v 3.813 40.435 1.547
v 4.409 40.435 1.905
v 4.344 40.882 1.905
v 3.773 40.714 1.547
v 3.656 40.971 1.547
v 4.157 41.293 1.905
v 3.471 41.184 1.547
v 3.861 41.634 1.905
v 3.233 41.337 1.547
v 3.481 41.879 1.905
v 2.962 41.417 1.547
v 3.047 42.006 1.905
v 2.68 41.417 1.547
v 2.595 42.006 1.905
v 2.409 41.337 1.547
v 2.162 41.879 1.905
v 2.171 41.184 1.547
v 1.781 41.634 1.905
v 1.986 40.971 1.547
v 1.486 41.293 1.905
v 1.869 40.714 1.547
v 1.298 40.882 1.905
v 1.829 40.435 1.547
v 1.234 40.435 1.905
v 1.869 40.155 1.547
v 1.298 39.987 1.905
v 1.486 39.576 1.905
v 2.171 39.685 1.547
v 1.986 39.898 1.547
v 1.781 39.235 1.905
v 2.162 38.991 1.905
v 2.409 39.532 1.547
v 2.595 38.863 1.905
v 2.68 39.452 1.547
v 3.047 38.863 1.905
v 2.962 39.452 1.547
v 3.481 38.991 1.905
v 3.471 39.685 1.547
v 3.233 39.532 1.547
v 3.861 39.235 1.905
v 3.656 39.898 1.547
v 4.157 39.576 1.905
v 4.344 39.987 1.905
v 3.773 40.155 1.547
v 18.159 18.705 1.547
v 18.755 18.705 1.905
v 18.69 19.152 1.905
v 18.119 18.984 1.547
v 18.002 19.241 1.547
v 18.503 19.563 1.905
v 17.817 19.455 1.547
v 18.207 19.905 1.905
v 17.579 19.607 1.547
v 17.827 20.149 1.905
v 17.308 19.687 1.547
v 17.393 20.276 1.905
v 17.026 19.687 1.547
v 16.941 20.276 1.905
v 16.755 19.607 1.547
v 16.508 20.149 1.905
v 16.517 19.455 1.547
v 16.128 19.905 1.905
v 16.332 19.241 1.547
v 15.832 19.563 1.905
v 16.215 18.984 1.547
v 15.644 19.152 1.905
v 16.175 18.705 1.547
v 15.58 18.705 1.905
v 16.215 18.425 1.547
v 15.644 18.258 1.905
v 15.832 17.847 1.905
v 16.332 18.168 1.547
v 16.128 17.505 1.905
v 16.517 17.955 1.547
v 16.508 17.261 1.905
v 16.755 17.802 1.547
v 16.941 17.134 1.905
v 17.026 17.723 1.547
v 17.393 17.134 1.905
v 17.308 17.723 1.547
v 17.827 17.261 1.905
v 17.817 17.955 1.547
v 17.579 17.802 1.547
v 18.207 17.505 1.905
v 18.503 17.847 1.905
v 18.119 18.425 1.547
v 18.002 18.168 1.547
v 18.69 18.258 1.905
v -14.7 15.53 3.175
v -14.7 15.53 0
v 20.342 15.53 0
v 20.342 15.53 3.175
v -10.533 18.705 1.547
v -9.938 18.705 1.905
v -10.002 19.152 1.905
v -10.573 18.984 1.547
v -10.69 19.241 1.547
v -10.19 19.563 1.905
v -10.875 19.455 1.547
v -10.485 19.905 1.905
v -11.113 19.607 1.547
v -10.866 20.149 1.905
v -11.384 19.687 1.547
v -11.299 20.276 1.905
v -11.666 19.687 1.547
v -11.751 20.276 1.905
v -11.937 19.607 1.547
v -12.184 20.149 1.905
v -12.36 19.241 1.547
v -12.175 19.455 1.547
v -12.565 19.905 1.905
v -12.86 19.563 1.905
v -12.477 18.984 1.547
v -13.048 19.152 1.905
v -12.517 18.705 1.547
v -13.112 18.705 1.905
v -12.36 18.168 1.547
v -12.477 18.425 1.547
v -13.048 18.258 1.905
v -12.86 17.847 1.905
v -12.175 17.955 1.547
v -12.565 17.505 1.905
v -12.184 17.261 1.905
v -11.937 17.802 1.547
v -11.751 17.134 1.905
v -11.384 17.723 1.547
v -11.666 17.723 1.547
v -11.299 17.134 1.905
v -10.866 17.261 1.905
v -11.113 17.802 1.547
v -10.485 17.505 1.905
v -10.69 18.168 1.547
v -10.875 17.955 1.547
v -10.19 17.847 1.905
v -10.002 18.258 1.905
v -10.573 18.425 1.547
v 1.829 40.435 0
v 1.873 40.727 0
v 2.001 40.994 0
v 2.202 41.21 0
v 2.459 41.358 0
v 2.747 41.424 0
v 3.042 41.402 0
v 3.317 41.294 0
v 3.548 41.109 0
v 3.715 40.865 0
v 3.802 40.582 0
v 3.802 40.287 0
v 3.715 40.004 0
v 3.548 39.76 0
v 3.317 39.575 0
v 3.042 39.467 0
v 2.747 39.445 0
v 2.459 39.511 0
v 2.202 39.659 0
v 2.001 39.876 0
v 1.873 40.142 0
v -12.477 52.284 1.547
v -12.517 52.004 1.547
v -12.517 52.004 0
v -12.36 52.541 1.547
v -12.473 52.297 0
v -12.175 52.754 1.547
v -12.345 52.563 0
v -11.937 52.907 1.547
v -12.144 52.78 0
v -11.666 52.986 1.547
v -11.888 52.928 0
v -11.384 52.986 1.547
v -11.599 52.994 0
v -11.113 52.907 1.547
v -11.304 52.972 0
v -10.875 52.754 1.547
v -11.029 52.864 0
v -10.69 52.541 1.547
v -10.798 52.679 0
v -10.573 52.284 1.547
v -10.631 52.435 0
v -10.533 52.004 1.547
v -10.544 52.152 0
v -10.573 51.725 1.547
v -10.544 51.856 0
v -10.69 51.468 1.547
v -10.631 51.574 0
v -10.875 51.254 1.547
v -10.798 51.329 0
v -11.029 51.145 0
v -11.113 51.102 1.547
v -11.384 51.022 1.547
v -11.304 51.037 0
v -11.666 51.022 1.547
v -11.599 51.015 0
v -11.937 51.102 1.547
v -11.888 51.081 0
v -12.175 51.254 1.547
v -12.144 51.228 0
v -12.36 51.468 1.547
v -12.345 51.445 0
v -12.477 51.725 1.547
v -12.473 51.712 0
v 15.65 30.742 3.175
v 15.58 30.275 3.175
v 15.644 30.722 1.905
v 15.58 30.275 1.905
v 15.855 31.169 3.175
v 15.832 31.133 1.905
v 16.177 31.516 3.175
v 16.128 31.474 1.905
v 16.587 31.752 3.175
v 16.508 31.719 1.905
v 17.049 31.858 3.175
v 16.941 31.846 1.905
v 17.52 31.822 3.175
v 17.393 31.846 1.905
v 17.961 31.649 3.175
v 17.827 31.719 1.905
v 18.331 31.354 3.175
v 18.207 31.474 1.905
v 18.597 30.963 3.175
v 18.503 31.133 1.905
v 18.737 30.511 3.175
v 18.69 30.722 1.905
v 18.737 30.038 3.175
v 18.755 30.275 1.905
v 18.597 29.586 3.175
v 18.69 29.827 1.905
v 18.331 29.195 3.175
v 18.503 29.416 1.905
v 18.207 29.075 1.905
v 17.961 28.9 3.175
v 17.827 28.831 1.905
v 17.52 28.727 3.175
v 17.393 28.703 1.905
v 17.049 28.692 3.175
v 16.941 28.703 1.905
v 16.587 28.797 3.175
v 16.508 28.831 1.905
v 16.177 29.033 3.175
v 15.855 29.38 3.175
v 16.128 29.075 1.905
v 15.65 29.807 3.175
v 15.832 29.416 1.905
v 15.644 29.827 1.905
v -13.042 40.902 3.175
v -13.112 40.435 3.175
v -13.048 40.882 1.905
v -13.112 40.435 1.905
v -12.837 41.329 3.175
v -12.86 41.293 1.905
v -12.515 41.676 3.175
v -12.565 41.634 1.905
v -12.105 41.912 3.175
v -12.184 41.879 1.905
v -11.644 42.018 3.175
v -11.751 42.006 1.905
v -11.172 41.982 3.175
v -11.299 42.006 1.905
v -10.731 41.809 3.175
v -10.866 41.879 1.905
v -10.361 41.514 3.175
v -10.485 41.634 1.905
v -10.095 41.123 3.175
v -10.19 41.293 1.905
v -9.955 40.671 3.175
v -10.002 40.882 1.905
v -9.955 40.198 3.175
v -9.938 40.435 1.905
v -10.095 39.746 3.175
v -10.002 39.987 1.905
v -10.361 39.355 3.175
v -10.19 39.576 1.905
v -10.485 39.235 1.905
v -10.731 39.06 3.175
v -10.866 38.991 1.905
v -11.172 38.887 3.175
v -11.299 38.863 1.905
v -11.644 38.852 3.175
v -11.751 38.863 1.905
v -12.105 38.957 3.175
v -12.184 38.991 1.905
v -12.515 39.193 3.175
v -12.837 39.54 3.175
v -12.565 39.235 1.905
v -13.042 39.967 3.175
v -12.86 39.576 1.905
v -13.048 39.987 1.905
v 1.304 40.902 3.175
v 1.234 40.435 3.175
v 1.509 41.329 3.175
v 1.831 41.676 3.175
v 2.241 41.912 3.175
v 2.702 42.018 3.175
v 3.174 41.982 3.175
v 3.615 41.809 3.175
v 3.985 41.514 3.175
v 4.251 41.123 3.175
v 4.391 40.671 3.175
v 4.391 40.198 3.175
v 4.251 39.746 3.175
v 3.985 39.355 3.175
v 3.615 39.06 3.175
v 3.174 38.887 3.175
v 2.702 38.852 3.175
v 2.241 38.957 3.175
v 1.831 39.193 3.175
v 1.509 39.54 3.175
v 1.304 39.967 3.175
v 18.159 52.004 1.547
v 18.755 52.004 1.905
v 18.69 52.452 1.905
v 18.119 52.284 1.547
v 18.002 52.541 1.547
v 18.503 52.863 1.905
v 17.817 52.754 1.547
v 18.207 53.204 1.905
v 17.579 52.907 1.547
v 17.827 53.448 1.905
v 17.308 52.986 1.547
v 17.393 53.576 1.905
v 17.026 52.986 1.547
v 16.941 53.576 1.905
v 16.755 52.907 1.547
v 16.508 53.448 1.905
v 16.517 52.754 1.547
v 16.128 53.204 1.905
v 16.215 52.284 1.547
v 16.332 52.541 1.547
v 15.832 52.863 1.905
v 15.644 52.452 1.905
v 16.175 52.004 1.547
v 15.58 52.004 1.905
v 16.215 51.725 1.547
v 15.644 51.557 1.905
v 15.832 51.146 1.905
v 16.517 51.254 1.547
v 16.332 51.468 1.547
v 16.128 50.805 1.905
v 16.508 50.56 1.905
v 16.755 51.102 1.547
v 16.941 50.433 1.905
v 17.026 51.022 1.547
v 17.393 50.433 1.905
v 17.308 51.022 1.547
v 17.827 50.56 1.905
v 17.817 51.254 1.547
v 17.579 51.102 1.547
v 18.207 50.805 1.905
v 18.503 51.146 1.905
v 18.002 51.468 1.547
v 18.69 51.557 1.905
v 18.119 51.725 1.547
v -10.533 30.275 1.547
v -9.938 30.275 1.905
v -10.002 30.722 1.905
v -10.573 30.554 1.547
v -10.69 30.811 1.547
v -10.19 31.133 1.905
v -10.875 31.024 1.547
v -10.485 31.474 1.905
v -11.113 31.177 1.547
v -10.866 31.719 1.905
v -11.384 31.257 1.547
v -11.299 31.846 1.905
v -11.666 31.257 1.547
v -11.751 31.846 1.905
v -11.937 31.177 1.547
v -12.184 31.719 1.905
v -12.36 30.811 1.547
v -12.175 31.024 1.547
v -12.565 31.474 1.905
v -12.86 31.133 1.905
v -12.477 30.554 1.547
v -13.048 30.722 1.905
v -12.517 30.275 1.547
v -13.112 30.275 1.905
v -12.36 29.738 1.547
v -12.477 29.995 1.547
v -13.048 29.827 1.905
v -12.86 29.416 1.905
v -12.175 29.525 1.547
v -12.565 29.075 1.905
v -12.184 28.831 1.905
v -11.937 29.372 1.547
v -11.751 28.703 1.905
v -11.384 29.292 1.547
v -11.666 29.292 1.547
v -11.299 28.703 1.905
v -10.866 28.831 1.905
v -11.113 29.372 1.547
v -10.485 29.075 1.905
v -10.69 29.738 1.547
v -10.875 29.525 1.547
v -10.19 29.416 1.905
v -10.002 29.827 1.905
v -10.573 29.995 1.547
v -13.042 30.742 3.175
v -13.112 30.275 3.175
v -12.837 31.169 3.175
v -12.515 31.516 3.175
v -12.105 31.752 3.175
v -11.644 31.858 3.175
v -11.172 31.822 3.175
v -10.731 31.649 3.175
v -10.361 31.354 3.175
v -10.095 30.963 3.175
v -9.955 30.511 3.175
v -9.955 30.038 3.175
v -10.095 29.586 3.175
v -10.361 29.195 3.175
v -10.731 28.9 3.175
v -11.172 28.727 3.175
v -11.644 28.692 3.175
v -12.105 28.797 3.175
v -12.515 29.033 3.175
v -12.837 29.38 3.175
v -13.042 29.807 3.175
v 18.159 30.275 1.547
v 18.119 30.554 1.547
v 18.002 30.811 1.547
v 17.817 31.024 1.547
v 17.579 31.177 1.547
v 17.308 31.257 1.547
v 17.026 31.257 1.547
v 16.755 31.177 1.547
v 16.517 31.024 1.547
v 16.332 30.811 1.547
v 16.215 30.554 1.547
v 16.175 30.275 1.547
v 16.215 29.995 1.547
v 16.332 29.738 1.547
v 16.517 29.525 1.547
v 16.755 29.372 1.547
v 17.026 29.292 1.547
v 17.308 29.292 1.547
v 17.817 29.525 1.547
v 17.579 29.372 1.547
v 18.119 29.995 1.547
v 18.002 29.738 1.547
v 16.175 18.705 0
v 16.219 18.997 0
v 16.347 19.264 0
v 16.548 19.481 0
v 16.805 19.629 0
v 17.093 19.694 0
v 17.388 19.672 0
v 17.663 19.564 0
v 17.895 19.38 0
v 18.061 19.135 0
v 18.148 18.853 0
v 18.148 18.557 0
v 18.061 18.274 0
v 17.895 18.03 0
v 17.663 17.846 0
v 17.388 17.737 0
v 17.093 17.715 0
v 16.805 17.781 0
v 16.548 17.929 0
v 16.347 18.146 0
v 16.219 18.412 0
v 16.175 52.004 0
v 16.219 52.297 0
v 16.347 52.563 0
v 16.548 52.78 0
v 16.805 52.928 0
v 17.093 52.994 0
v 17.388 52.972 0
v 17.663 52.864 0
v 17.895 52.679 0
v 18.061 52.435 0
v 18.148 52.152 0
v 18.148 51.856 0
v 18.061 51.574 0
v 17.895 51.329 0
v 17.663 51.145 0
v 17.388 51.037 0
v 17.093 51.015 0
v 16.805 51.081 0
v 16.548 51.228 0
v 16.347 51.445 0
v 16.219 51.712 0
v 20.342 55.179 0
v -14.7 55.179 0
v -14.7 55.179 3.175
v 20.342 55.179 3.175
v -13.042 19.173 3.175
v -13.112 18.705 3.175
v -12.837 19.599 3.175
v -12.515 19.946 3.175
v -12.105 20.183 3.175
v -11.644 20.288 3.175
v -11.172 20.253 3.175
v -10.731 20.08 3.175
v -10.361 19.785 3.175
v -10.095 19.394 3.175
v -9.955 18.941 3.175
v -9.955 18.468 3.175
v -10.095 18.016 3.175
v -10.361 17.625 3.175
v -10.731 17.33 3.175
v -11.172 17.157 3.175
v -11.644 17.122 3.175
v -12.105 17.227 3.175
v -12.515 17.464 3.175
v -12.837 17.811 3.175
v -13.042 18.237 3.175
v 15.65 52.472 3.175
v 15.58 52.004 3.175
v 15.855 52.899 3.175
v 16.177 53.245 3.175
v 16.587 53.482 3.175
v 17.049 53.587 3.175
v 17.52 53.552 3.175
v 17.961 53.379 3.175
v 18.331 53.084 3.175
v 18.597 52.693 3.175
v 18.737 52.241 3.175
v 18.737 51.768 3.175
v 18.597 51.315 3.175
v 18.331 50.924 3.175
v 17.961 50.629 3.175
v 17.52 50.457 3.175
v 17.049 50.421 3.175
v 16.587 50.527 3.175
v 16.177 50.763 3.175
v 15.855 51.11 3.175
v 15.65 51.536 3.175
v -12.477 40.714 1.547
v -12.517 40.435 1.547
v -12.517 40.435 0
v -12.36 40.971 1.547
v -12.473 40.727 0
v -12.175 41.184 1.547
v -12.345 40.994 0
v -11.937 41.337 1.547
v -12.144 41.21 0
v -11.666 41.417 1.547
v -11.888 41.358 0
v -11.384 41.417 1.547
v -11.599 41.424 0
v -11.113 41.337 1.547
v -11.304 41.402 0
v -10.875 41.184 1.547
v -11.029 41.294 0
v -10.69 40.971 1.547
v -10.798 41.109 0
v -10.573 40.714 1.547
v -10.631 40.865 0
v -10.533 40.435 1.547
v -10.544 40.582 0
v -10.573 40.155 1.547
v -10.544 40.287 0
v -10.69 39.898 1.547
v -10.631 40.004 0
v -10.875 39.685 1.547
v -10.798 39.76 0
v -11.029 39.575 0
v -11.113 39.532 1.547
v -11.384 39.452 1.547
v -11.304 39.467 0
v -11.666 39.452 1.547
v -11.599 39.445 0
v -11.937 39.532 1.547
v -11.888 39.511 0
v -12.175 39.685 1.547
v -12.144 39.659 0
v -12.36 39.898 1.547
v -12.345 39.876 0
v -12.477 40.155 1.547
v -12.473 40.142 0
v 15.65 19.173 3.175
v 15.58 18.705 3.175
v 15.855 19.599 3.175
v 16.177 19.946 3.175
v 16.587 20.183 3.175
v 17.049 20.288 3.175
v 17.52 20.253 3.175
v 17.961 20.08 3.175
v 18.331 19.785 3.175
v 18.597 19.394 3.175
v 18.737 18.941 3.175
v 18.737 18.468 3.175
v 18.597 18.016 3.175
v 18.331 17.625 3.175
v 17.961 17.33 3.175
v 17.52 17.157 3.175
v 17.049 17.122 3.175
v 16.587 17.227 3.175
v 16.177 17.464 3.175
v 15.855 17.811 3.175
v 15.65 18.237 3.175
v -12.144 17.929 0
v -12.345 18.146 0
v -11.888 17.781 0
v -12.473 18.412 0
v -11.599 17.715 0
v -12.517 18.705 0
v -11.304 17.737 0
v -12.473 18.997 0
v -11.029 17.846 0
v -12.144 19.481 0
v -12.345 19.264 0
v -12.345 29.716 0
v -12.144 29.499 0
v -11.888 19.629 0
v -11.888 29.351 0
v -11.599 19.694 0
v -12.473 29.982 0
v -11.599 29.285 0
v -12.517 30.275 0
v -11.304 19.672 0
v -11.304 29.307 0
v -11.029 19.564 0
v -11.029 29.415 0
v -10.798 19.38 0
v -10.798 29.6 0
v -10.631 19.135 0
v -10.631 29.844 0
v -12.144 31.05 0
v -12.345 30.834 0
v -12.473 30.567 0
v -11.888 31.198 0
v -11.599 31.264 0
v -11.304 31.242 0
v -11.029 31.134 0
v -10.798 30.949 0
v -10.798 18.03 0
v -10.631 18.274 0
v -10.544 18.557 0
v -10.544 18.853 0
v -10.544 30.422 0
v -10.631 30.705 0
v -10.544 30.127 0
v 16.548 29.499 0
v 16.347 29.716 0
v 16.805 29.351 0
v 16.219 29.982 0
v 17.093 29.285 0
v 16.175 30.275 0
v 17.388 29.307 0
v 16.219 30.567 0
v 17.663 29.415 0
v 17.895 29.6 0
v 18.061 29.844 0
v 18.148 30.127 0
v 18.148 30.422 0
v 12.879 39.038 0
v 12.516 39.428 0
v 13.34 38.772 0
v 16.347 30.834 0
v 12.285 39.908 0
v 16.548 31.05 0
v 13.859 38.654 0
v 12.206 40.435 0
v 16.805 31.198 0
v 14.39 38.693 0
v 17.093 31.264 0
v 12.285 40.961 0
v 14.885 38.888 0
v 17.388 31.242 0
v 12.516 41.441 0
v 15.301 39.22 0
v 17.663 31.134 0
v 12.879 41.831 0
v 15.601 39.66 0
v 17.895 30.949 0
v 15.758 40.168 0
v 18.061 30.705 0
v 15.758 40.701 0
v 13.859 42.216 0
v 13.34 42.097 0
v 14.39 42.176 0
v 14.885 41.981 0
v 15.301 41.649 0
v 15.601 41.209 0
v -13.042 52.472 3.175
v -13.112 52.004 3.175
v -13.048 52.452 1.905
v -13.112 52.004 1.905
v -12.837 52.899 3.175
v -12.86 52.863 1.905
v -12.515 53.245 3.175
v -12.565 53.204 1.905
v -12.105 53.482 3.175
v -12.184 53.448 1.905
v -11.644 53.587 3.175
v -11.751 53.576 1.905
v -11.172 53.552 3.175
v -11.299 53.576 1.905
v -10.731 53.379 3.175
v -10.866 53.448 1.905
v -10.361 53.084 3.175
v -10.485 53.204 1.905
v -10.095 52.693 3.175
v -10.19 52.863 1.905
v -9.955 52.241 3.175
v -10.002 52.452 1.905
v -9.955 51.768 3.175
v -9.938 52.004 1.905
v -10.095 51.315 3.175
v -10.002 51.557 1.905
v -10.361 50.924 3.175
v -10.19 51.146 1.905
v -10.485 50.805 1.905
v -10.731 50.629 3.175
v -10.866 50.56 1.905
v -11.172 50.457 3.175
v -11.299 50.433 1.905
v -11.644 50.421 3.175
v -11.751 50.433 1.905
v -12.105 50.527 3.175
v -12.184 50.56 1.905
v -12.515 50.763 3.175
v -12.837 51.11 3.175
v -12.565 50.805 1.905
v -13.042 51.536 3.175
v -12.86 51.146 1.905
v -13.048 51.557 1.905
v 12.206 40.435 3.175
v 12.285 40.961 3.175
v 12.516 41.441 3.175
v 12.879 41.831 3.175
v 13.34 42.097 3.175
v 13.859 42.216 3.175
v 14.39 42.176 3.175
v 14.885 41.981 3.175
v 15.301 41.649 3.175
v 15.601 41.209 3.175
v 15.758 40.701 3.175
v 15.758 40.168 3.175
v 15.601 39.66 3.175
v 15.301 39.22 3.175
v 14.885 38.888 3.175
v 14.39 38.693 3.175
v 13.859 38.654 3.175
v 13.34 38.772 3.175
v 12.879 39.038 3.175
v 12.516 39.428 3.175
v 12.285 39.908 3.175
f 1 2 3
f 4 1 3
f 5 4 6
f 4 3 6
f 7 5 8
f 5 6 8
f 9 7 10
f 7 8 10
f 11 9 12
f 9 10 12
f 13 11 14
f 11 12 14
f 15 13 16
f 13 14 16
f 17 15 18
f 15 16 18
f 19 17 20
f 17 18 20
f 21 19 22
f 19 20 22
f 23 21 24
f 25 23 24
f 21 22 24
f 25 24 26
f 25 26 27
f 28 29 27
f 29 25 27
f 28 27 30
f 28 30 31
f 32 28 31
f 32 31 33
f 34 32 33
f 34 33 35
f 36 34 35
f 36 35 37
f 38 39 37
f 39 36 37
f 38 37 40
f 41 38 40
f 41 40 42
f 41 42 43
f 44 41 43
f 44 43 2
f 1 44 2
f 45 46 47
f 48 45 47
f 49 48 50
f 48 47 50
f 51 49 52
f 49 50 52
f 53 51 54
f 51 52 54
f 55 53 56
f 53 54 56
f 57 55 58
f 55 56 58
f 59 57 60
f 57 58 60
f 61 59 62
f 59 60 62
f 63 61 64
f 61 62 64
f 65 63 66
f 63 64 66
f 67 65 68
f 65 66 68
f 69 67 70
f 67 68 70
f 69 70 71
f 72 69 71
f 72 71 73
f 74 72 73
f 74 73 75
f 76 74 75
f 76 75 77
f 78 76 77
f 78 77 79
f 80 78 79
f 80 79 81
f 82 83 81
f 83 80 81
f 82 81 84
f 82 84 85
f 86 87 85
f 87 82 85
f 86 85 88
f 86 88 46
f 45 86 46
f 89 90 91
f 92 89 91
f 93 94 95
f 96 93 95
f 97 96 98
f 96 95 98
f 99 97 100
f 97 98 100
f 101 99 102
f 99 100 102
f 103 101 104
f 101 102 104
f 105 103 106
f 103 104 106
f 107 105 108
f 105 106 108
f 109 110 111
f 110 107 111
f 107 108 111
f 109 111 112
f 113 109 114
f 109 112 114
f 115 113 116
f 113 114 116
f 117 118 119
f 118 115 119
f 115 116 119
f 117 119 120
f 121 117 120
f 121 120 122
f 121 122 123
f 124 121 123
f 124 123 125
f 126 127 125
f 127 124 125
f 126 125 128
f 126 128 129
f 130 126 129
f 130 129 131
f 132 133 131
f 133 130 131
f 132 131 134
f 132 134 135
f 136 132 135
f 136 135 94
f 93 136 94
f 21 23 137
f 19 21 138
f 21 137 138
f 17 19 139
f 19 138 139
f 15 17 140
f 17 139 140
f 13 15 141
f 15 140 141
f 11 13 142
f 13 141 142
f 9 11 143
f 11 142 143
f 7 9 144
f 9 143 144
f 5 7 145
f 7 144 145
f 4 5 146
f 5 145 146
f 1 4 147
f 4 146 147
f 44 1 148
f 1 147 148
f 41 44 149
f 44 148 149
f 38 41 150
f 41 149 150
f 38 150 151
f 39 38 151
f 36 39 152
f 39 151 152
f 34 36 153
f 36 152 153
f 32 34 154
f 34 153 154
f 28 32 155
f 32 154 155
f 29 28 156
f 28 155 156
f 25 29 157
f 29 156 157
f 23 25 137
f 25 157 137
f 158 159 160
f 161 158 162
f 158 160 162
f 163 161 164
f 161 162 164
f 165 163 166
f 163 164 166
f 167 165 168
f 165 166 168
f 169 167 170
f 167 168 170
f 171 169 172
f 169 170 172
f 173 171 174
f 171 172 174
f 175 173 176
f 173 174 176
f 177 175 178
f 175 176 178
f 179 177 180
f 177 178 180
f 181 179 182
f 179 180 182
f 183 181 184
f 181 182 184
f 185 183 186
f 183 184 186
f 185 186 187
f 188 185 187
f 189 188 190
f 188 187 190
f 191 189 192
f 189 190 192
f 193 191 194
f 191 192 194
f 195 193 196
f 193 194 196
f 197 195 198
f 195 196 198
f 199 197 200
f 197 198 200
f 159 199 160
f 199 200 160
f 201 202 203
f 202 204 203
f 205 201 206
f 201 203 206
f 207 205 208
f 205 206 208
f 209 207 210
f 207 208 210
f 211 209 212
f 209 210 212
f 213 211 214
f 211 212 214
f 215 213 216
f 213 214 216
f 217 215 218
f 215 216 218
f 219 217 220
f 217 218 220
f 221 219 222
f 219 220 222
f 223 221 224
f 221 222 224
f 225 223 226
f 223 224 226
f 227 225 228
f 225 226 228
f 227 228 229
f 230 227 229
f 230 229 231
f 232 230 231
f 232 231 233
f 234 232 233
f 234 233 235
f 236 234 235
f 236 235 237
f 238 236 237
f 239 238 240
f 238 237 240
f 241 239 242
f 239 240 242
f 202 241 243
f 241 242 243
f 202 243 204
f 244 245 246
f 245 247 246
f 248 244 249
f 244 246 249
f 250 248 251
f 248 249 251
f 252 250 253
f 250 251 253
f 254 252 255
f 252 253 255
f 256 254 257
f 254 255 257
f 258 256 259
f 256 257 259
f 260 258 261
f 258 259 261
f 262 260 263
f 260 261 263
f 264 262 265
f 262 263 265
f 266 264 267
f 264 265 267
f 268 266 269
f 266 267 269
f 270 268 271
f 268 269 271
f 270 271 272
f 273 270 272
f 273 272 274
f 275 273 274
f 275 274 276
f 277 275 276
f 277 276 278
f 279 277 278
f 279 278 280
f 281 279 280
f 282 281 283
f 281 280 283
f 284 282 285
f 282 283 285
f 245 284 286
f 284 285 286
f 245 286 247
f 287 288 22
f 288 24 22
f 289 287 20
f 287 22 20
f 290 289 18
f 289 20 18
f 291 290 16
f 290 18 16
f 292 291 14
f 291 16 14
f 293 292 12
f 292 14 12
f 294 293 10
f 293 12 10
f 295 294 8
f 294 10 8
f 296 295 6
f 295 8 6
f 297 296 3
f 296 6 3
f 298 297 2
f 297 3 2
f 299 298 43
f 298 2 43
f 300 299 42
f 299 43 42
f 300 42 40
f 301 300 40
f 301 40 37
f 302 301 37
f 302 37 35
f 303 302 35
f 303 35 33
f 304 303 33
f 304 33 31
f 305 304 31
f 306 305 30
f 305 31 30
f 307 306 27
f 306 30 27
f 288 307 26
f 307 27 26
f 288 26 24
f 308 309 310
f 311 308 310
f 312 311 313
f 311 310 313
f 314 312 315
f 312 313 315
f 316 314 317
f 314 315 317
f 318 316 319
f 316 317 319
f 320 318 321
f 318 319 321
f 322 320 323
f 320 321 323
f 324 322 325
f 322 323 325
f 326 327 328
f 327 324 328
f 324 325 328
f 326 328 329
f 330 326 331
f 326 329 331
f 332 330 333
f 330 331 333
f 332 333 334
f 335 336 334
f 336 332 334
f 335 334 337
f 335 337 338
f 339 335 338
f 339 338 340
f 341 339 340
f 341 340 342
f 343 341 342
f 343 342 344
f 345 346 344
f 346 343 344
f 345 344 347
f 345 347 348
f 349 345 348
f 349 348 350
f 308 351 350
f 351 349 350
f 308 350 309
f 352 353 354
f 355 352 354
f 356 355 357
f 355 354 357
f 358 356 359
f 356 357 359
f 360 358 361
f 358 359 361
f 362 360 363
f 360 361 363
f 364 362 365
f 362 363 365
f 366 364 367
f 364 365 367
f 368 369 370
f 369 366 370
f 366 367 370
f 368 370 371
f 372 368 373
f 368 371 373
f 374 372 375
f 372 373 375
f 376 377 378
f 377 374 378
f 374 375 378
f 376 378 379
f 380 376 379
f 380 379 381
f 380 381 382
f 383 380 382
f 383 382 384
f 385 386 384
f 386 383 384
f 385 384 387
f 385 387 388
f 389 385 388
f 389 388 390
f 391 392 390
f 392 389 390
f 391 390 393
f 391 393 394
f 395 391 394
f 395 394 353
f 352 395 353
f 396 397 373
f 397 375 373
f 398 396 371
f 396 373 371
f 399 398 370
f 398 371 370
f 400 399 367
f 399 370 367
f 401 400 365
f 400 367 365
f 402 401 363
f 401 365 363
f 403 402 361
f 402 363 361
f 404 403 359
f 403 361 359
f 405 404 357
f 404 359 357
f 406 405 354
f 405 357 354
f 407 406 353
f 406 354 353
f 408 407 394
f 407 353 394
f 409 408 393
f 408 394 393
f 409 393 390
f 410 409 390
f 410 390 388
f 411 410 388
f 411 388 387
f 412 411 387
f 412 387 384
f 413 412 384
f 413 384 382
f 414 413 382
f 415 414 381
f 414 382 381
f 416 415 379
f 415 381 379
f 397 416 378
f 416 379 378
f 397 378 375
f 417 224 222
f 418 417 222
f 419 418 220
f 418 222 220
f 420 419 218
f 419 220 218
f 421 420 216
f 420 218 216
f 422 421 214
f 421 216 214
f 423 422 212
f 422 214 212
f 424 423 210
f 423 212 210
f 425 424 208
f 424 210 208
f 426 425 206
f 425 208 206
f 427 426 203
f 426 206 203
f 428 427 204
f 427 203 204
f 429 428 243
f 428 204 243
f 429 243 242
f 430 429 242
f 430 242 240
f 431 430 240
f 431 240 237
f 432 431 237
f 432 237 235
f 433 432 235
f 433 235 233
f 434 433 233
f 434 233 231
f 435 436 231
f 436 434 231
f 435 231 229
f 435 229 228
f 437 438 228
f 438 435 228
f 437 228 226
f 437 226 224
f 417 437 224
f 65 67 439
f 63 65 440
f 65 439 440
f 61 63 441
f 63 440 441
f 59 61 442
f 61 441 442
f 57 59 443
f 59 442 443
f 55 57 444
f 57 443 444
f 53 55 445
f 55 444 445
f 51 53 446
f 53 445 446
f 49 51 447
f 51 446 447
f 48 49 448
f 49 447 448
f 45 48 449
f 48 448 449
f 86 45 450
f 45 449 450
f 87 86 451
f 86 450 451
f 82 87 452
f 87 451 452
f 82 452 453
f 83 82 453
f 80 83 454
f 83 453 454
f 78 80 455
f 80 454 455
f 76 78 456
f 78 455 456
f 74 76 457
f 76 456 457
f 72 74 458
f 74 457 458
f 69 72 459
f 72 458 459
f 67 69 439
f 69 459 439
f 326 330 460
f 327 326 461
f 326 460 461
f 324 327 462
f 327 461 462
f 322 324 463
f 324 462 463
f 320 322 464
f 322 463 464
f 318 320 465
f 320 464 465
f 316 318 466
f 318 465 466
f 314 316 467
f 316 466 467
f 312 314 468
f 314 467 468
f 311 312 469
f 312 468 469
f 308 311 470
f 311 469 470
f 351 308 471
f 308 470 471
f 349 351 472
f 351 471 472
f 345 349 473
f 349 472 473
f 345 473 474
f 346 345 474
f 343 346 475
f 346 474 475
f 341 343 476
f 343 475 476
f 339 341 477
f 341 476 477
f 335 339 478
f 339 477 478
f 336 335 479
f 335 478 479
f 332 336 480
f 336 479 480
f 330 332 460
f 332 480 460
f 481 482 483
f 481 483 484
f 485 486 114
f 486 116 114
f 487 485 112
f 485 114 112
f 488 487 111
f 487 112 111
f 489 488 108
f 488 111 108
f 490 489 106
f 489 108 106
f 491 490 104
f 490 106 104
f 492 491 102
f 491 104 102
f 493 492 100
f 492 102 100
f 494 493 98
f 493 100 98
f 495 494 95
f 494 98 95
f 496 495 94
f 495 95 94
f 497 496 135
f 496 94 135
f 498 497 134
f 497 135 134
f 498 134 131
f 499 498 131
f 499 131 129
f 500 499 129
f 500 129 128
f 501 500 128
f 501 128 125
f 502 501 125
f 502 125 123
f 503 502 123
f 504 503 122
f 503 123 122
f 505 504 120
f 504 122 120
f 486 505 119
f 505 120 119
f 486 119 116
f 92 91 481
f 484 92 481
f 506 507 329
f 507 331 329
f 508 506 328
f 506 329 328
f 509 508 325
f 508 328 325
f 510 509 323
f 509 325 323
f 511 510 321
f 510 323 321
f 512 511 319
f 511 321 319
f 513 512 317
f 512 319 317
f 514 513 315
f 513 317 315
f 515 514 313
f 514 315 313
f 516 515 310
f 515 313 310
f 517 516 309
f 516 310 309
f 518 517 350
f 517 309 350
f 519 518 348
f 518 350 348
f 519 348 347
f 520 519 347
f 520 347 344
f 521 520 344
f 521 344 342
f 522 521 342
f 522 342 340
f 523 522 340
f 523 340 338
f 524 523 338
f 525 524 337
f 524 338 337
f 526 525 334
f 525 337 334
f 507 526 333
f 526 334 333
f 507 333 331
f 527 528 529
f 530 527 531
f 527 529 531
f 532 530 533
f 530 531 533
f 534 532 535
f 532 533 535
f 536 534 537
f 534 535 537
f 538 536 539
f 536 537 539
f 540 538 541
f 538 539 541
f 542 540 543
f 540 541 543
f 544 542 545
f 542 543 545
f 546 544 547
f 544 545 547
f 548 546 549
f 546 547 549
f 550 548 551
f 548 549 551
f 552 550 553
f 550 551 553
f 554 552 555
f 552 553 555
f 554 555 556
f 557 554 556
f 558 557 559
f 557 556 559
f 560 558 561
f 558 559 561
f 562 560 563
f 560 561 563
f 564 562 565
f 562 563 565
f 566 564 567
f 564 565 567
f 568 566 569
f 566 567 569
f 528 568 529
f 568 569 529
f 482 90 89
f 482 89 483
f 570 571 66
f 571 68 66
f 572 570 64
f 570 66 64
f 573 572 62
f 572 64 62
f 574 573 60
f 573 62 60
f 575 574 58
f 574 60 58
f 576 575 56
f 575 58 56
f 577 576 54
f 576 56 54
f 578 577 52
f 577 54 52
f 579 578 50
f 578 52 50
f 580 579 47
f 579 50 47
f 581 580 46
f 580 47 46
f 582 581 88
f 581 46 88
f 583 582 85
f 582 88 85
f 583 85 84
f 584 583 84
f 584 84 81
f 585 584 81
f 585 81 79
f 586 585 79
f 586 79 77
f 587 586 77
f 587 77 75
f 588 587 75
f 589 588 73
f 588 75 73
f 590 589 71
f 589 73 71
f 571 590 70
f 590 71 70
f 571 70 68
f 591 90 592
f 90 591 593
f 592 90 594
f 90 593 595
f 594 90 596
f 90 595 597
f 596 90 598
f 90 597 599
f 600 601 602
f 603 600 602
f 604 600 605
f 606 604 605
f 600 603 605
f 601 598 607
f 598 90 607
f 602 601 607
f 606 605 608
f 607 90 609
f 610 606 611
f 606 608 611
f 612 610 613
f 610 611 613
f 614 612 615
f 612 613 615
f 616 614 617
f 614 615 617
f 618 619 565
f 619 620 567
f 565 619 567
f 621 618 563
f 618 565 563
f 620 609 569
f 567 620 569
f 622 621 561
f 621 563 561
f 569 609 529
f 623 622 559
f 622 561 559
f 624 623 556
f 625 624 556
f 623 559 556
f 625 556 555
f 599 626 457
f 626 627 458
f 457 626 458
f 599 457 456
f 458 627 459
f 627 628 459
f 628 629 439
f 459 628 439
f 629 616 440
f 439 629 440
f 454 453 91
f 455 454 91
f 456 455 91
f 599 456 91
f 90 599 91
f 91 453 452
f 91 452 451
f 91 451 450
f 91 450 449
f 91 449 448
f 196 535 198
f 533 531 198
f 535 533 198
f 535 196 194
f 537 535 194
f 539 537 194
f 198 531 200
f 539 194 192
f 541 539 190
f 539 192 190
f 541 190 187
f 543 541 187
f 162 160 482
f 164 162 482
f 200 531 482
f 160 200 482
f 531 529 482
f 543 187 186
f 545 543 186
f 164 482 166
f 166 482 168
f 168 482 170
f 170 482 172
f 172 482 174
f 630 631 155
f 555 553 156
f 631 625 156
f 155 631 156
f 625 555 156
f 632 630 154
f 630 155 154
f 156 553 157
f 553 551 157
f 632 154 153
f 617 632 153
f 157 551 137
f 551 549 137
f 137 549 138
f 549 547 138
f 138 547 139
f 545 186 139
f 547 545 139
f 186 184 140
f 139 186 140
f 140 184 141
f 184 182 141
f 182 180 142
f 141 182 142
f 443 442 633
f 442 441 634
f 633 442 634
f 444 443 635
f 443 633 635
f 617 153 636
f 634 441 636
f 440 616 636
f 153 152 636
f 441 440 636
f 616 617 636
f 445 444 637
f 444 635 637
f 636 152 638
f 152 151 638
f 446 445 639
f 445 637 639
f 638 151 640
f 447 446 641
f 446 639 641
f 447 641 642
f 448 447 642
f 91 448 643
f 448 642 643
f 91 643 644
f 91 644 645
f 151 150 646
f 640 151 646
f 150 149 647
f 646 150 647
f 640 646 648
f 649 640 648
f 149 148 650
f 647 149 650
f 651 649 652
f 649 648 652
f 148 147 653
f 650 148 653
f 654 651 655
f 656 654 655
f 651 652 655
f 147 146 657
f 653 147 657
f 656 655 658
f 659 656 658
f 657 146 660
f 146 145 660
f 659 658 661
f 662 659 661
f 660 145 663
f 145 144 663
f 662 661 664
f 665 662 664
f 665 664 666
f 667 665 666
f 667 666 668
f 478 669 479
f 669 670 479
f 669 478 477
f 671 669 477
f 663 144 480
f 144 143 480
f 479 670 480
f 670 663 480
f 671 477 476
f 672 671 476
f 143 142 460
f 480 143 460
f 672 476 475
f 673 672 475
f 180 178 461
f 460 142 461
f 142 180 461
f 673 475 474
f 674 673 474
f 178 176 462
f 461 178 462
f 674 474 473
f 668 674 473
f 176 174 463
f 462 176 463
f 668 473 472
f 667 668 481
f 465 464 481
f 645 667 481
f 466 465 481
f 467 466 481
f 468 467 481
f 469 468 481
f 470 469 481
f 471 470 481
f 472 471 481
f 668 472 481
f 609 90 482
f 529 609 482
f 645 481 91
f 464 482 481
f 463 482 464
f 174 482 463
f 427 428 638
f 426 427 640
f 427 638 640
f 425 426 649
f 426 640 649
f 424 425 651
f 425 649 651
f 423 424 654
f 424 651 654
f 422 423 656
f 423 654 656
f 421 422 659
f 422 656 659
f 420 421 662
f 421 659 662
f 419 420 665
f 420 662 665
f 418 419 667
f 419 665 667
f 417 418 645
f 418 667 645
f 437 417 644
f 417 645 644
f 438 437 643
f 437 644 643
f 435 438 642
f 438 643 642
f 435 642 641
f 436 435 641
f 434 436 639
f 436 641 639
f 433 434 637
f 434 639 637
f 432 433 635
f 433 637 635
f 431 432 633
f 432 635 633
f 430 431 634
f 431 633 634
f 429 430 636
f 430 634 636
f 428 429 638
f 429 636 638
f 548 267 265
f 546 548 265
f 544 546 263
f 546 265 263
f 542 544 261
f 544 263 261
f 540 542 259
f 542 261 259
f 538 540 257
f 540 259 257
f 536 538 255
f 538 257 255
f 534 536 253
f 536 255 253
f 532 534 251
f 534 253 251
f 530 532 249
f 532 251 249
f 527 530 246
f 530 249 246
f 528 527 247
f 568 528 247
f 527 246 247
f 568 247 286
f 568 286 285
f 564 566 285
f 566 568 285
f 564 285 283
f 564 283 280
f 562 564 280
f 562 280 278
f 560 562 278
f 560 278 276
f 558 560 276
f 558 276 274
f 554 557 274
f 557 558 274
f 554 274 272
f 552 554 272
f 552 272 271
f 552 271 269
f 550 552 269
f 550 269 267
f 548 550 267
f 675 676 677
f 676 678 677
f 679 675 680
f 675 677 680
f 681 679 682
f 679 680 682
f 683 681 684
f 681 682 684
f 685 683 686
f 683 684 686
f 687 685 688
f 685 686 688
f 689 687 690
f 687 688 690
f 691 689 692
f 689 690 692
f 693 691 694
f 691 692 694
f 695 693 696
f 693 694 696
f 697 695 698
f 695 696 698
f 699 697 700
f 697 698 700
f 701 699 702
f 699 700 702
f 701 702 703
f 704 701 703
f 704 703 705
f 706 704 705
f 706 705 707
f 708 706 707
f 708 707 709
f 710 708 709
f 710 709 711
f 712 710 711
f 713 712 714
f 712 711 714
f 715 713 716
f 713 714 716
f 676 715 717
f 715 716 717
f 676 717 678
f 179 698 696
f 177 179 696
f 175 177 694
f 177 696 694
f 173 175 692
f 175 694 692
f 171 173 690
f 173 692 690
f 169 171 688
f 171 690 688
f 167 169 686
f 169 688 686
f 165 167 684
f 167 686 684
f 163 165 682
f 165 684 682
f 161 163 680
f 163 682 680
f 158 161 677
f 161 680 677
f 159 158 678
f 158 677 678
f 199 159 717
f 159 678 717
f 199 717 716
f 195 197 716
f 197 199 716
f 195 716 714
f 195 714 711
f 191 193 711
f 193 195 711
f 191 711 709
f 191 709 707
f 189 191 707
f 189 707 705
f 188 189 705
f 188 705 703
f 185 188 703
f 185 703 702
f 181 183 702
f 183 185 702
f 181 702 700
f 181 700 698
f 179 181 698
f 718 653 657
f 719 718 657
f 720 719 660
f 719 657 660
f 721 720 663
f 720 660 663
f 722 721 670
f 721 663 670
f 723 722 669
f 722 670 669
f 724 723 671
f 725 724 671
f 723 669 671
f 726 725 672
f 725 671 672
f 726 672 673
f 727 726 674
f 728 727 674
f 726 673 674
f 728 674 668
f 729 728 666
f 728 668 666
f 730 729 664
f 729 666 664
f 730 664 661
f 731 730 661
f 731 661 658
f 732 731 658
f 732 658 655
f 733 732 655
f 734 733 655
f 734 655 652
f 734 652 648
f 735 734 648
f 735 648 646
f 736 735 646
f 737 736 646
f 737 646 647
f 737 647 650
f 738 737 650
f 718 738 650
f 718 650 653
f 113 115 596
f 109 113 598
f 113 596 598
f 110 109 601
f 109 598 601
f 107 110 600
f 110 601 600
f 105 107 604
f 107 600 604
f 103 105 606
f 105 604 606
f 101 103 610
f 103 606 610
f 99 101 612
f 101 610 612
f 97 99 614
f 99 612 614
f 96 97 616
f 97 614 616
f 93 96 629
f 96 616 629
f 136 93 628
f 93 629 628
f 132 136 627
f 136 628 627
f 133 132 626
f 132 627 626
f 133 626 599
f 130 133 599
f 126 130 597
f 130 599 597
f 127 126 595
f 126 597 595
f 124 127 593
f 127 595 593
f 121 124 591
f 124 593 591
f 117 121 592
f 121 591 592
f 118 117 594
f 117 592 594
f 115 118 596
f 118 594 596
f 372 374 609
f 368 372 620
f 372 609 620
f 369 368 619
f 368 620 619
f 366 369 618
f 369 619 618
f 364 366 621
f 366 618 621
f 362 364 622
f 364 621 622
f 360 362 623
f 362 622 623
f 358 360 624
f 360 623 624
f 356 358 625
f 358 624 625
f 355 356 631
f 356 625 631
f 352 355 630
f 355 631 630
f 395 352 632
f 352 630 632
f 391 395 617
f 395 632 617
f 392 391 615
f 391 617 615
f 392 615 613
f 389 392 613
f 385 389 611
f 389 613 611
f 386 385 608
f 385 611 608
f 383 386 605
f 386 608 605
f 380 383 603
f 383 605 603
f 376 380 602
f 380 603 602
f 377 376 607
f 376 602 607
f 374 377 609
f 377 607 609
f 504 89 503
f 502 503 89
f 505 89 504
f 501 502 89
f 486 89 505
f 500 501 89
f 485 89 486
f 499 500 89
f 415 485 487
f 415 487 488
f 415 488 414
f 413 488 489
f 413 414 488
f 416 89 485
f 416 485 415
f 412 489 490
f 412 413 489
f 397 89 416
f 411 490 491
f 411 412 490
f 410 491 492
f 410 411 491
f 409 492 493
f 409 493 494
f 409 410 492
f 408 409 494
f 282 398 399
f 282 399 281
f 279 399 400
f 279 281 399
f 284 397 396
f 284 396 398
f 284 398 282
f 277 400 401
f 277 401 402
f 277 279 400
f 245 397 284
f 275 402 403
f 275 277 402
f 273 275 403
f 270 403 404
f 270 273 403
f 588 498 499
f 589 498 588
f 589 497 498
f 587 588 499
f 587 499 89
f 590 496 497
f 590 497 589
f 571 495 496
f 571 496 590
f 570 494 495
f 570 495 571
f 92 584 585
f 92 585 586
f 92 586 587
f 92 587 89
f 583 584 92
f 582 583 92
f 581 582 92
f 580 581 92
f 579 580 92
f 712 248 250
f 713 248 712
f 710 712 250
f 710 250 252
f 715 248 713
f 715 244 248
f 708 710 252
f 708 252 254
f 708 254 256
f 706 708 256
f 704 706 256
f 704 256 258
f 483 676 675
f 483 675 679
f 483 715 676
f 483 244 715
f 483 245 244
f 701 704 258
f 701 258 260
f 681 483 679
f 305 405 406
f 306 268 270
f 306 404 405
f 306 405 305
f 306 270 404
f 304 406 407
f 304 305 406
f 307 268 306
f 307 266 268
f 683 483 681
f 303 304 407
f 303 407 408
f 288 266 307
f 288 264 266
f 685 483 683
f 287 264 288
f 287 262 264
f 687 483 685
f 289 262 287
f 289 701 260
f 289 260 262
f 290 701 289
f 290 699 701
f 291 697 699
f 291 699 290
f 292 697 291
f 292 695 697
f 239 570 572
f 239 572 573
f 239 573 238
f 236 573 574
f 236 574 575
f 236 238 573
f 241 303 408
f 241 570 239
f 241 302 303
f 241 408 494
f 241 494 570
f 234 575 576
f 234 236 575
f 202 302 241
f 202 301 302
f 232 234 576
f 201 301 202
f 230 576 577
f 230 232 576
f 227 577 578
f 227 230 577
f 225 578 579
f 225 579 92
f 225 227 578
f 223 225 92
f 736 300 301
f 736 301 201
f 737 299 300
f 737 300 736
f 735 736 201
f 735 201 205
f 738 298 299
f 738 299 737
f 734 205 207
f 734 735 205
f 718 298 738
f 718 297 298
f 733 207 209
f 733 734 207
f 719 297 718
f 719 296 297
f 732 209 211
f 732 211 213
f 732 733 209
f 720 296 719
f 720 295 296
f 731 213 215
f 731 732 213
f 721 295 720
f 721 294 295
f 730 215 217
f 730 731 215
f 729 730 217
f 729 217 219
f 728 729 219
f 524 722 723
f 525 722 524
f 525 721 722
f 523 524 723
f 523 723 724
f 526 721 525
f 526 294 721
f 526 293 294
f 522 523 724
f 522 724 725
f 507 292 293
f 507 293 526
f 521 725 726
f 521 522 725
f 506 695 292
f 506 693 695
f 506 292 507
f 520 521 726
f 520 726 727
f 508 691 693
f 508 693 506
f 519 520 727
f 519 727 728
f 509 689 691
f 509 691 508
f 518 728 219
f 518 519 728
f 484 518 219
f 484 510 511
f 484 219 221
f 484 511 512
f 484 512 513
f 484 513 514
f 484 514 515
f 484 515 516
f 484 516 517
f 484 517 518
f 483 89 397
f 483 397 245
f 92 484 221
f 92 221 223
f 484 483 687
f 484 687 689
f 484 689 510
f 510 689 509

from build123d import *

# Parameters (mm, degrees)
SKETCH1_W                        = 35.042145822
SKETCH1_H                        = 39.6494
BOSS_EXTRUDE1_DEPTH              = 3.175
F_9_64_0_14063_DIAMETER_HOLE1_D  = 3.572002
F_5_64_0_07813_DIAMETER_HOLE1_D  = 1.984502
F_1_8_0_125_DIAMETER_HOLE1_D     = 3.175
F_1_8_0_125_DIAMETER_HOLE1_DEPTH = 1.27
F_1_8_0_125_DIAMETER_HOLE1_TIP   = 0.953866233


with BuildPart() as part:
    # Sketch1 → Boss-Extrude1 (new body)
    with BuildSketch(Plane.XY):
        with Locations((2.821072911, 35.354563982)):
            Rectangle(SKETCH1_W, SKETCH1_H)
    extrude(amount=BOSS_EXTRUDE1_DEPTH)

    # 9/64 (0.14063) Diameter Hole1 (through all)
    with Locations(Plane.XY.offset(3.175)):
        with Locations((13.992145822, 40.434563982)):
            Hole(F_9_64_0_14063_DIAMETER_HOLE1_D / 2)

    # 5/64 (0.07813) Diameter Hole1 (through all)
    with Locations(Plane.XY.offset(3.175)):
        with Locations((-11.525, 40.434563982), (-11.525, 52.004263982), (17.167145822, 52.004263982), (2.821072911, 40.434563982), (-11.525, 30.274563982), (-11.525, 18.704863982), (17.167145822, 18.704863982), (17.167145822, 30.274563982)):
            Hole(F_5_64_0_07813_DIAMETER_HOLE1_D / 2)

    # 1/8 (0.125) Diameter Hole1
    with Locations(Plane.XY.offset(3.175)):
        with Locations((17.167145822, 18.704863982), (-11.525, 18.704863982), (-11.525, 30.274563982), (17.167145822, 30.274563982), (2.821072911, 40.434563982), (-11.525, 40.434563982), (17.167145822, 52.004263982), (-11.525, 52.004263982)):
            Hole(F_1_8_0_125_DIAMETER_HOLE1_D / 2, depth=F_1_8_0_125_DIAMETER_HOLE1_DEPTH)
            with Locations((0, 0, -(F_1_8_0_125_DIAMETER_HOLE1_DEPTH + F_1_8_0_125_DIAMETER_HOLE1_TIP / 2))):  # 118° drill point
                Cone(0, F_1_8_0_125_DIAMETER_HOLE1_D / 2, F_1_8_0_125_DIAMETER_HOLE1_TIP, mode=Mode.SUBTRACT)


solid = part.part
